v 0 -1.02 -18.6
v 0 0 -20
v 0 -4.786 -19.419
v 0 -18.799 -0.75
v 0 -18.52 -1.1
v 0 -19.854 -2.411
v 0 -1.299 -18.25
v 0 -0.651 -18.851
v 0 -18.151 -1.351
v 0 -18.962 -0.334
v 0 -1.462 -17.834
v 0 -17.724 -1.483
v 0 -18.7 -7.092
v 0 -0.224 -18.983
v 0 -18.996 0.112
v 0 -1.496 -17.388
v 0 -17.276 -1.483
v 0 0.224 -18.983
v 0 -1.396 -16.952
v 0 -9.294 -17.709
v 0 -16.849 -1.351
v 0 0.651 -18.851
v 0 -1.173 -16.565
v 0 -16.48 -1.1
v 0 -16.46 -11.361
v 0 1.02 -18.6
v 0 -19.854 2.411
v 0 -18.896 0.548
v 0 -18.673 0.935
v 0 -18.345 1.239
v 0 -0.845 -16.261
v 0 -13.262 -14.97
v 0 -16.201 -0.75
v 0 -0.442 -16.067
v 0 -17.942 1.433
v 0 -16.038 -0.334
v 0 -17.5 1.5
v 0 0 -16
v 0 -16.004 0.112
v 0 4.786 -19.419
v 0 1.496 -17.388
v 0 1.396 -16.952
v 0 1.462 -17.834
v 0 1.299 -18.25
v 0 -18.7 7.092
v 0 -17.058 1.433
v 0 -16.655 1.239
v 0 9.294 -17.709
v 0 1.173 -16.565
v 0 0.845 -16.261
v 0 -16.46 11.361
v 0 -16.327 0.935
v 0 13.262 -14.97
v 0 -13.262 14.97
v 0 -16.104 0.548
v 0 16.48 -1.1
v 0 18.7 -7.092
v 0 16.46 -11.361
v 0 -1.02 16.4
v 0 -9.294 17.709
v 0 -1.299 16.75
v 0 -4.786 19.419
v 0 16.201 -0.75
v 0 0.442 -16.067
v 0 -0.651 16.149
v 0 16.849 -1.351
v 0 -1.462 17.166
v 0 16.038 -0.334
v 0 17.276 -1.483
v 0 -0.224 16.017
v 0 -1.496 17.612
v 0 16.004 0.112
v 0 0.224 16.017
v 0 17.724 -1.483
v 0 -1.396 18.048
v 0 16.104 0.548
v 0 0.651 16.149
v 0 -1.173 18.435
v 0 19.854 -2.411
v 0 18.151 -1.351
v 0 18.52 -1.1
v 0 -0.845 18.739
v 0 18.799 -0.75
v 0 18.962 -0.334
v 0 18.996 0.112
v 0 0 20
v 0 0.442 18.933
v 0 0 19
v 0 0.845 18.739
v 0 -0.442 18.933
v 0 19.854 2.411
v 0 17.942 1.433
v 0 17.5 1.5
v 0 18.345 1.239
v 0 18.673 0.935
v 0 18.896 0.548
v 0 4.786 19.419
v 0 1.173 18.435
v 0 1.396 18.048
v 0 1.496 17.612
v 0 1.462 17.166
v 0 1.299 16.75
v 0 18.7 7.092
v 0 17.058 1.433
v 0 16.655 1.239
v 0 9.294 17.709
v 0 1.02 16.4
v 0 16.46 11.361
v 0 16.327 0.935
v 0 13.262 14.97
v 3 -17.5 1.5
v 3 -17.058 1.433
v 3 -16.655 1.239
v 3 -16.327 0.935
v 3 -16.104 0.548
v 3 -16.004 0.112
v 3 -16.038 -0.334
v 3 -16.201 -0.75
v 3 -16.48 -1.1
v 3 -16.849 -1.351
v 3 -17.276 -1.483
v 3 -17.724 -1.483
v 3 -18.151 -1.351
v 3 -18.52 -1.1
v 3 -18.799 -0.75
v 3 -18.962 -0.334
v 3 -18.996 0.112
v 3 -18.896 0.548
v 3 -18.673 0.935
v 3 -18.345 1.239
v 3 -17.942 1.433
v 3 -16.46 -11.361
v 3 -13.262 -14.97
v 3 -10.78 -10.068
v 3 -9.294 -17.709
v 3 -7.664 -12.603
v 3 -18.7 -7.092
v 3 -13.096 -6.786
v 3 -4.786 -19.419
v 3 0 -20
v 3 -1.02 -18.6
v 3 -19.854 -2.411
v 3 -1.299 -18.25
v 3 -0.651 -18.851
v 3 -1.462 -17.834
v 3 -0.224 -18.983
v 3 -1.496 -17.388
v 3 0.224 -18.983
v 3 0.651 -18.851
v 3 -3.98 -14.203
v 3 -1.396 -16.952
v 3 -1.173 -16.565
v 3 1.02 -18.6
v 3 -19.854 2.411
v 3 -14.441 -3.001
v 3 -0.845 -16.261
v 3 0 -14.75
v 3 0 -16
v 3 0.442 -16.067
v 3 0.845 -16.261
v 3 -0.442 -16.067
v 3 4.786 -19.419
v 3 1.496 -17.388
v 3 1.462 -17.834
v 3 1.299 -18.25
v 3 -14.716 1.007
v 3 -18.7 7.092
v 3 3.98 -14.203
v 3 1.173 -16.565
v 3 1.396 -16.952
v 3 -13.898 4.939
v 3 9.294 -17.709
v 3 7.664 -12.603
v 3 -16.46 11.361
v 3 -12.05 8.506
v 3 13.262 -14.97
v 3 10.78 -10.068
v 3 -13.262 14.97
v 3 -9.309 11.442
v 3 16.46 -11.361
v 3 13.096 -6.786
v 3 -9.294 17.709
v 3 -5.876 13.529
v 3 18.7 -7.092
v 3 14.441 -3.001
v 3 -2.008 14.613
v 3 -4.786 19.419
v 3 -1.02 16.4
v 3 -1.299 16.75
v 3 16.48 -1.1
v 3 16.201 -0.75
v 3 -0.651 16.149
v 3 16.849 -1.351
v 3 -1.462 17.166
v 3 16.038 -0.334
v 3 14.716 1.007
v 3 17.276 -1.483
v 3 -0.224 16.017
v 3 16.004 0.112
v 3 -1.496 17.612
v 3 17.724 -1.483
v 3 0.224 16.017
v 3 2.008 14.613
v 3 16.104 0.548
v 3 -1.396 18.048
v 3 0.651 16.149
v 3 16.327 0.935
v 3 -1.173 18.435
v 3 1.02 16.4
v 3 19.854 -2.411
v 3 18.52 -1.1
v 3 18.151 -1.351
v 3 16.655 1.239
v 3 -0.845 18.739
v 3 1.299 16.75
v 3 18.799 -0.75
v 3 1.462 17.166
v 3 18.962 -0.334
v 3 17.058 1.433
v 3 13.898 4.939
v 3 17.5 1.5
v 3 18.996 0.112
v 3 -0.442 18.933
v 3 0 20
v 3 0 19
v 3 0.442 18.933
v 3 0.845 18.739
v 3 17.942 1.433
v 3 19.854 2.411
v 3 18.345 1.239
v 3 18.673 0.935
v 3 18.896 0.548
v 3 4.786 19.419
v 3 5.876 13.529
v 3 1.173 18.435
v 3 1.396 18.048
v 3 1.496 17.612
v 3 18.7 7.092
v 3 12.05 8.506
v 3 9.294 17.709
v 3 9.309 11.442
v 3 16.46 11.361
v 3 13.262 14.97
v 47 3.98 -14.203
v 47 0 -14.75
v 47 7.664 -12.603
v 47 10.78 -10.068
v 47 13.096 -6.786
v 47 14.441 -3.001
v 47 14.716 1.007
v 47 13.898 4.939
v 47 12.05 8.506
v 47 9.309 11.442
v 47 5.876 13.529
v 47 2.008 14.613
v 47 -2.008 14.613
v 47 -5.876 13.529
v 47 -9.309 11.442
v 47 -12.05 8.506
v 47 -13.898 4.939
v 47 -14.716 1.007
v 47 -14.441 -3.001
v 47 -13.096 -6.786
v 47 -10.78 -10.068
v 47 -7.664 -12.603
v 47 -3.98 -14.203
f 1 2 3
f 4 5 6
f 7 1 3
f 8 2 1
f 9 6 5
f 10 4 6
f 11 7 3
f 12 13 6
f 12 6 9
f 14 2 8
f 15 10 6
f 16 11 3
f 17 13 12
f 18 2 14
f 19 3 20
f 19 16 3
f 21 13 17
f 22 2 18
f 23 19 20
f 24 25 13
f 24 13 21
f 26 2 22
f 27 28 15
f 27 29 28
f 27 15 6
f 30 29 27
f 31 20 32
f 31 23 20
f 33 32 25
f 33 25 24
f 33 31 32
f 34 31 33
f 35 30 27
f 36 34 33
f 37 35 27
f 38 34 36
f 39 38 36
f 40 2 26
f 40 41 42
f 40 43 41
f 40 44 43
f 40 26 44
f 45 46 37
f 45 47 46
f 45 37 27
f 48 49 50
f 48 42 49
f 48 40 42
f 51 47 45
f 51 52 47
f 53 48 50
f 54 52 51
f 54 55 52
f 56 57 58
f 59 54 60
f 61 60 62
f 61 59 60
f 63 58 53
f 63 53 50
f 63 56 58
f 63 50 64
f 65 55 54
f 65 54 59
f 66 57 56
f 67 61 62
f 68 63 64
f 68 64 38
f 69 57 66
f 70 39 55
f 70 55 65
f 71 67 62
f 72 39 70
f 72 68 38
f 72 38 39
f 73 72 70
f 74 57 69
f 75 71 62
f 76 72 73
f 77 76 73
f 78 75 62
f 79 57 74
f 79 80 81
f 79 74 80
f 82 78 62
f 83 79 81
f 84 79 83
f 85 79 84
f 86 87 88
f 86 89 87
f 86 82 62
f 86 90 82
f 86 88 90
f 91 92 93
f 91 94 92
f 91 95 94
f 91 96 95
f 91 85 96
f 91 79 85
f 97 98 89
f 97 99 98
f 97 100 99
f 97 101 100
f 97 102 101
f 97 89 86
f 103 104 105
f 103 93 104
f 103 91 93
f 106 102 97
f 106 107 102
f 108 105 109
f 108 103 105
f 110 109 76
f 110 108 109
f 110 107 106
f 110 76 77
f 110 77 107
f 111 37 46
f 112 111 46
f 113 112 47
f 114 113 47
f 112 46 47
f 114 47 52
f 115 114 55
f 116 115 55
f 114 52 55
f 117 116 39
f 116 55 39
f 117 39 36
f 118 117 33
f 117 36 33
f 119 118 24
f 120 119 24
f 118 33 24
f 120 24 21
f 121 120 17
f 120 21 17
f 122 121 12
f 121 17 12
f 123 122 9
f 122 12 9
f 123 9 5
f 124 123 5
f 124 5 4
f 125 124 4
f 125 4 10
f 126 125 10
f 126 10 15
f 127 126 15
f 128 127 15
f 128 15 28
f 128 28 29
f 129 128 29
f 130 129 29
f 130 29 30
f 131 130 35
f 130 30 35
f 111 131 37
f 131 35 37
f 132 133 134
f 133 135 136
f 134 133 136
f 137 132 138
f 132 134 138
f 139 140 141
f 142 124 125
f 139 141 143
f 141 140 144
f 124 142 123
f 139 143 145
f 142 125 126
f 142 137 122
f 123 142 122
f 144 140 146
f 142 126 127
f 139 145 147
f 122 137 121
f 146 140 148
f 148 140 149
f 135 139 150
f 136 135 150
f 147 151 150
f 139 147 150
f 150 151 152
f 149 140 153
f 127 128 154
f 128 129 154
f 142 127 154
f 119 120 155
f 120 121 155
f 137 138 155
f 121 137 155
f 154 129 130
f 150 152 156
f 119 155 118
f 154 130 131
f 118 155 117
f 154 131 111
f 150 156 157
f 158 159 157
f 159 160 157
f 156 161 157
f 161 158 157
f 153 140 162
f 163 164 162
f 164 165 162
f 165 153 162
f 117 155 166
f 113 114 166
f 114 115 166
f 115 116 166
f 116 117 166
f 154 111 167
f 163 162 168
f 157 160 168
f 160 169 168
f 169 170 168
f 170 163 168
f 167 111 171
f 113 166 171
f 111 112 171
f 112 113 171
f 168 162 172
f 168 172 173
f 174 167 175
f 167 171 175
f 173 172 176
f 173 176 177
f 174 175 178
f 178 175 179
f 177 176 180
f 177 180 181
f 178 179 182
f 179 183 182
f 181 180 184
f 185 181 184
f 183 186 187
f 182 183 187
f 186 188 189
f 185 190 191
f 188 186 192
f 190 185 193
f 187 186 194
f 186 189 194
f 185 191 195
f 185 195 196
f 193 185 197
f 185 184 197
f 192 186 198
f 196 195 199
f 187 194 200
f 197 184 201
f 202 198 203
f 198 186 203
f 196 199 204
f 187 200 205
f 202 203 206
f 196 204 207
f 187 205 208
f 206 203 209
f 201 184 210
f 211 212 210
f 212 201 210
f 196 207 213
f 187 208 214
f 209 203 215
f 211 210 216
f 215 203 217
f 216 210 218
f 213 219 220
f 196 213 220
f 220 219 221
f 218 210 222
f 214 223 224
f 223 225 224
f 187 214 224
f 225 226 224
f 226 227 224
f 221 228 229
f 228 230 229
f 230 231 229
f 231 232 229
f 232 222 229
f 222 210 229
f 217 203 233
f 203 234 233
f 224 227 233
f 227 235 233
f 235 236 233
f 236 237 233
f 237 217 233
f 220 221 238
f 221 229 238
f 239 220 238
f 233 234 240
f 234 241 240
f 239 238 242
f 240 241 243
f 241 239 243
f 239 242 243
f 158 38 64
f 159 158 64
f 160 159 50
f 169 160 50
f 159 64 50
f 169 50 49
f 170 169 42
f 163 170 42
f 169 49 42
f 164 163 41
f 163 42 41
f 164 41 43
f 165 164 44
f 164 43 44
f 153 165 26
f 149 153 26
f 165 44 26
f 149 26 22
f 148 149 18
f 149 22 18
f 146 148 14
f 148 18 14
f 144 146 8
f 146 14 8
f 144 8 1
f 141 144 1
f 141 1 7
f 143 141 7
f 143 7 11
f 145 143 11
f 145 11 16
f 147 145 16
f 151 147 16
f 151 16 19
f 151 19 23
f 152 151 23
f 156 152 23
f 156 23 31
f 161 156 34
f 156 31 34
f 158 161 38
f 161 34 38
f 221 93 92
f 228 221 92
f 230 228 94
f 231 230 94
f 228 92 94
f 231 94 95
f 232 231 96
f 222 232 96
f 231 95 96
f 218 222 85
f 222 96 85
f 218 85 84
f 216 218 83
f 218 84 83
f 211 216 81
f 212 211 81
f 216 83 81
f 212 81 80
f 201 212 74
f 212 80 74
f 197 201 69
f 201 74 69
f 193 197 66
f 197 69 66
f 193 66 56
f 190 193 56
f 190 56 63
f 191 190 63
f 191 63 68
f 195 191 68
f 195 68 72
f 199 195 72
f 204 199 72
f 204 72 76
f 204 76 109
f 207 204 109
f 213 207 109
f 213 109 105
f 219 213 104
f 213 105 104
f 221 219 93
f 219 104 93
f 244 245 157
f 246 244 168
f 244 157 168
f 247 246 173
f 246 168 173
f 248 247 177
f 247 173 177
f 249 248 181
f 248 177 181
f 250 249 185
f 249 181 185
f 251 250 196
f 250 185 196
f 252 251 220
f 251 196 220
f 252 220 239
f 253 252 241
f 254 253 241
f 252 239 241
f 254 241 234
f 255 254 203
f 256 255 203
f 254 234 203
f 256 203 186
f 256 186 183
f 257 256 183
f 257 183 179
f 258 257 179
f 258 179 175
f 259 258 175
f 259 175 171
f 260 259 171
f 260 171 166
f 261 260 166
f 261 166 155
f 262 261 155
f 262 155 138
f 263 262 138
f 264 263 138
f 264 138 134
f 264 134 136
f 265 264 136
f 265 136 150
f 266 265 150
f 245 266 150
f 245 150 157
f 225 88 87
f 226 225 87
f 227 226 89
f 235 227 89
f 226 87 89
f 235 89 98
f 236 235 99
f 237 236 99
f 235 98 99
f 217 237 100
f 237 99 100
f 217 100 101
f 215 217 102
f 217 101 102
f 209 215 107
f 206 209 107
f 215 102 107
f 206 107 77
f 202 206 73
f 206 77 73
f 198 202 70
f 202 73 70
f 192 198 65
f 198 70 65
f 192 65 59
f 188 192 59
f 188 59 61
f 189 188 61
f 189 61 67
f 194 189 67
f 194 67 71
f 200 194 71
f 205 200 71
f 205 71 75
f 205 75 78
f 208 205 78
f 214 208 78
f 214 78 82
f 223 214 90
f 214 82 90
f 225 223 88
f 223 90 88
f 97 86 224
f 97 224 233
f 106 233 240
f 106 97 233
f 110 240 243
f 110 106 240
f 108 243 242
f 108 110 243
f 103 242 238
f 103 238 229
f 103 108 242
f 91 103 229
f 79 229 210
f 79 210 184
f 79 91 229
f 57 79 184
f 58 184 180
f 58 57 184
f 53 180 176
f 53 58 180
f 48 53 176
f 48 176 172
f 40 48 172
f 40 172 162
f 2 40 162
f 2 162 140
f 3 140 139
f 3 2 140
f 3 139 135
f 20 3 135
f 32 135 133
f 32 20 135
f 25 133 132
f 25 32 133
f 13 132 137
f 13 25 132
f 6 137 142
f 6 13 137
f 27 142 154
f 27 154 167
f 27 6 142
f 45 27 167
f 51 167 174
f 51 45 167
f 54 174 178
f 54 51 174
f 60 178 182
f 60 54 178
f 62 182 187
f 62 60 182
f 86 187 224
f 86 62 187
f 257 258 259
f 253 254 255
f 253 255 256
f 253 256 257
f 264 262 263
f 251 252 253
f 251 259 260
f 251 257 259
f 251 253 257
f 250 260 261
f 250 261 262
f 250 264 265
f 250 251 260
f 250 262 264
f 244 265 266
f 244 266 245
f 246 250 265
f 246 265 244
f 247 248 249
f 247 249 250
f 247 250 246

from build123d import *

# Parameters (mm, degrees)
SKETCH1_R           = 14.75
BOSS_EXTRUDE1_DEPTH = 47
SKETCH2_R           = 20
SKETCH2_R_2         = 1.5
BOSS_EXTRUDE2_DEPTH = 3


with BuildPart() as part:
    # Sketch1 → Boss-Extrude1 (new body)
    with BuildSketch(Plane(origin=(0, 0, 0), x_dir=(0, 0, -1), z_dir=(1, 0, 0))):
        Circle(SKETCH1_R)
    extrude(amount=BOSS_EXTRUDE1_DEPTH)

    # Sketch2 → Boss-Extrude2 (add)
    with BuildSketch(Plane.ZY):
        Circle(SKETCH2_R)
        with Locations((0, 17.5)):
            Circle(SKETCH2_R_2, mode=Mode.SUBTRACT)
        with Locations((17.5, 0)):
            Circle(SKETCH2_R_2, mode=Mode.SUBTRACT)
        with Locations((0, -17.5)):
            Circle(SKETCH2_R_2, mode=Mode.SUBTRACT)
        with Locations((-17.5, 0)):
            Circle(SKETCH2_R_2, mode=Mode.SUBTRACT)
    extrude(amount=-BOSS_EXTRUDE2_DEPTH)


solid = part.part
